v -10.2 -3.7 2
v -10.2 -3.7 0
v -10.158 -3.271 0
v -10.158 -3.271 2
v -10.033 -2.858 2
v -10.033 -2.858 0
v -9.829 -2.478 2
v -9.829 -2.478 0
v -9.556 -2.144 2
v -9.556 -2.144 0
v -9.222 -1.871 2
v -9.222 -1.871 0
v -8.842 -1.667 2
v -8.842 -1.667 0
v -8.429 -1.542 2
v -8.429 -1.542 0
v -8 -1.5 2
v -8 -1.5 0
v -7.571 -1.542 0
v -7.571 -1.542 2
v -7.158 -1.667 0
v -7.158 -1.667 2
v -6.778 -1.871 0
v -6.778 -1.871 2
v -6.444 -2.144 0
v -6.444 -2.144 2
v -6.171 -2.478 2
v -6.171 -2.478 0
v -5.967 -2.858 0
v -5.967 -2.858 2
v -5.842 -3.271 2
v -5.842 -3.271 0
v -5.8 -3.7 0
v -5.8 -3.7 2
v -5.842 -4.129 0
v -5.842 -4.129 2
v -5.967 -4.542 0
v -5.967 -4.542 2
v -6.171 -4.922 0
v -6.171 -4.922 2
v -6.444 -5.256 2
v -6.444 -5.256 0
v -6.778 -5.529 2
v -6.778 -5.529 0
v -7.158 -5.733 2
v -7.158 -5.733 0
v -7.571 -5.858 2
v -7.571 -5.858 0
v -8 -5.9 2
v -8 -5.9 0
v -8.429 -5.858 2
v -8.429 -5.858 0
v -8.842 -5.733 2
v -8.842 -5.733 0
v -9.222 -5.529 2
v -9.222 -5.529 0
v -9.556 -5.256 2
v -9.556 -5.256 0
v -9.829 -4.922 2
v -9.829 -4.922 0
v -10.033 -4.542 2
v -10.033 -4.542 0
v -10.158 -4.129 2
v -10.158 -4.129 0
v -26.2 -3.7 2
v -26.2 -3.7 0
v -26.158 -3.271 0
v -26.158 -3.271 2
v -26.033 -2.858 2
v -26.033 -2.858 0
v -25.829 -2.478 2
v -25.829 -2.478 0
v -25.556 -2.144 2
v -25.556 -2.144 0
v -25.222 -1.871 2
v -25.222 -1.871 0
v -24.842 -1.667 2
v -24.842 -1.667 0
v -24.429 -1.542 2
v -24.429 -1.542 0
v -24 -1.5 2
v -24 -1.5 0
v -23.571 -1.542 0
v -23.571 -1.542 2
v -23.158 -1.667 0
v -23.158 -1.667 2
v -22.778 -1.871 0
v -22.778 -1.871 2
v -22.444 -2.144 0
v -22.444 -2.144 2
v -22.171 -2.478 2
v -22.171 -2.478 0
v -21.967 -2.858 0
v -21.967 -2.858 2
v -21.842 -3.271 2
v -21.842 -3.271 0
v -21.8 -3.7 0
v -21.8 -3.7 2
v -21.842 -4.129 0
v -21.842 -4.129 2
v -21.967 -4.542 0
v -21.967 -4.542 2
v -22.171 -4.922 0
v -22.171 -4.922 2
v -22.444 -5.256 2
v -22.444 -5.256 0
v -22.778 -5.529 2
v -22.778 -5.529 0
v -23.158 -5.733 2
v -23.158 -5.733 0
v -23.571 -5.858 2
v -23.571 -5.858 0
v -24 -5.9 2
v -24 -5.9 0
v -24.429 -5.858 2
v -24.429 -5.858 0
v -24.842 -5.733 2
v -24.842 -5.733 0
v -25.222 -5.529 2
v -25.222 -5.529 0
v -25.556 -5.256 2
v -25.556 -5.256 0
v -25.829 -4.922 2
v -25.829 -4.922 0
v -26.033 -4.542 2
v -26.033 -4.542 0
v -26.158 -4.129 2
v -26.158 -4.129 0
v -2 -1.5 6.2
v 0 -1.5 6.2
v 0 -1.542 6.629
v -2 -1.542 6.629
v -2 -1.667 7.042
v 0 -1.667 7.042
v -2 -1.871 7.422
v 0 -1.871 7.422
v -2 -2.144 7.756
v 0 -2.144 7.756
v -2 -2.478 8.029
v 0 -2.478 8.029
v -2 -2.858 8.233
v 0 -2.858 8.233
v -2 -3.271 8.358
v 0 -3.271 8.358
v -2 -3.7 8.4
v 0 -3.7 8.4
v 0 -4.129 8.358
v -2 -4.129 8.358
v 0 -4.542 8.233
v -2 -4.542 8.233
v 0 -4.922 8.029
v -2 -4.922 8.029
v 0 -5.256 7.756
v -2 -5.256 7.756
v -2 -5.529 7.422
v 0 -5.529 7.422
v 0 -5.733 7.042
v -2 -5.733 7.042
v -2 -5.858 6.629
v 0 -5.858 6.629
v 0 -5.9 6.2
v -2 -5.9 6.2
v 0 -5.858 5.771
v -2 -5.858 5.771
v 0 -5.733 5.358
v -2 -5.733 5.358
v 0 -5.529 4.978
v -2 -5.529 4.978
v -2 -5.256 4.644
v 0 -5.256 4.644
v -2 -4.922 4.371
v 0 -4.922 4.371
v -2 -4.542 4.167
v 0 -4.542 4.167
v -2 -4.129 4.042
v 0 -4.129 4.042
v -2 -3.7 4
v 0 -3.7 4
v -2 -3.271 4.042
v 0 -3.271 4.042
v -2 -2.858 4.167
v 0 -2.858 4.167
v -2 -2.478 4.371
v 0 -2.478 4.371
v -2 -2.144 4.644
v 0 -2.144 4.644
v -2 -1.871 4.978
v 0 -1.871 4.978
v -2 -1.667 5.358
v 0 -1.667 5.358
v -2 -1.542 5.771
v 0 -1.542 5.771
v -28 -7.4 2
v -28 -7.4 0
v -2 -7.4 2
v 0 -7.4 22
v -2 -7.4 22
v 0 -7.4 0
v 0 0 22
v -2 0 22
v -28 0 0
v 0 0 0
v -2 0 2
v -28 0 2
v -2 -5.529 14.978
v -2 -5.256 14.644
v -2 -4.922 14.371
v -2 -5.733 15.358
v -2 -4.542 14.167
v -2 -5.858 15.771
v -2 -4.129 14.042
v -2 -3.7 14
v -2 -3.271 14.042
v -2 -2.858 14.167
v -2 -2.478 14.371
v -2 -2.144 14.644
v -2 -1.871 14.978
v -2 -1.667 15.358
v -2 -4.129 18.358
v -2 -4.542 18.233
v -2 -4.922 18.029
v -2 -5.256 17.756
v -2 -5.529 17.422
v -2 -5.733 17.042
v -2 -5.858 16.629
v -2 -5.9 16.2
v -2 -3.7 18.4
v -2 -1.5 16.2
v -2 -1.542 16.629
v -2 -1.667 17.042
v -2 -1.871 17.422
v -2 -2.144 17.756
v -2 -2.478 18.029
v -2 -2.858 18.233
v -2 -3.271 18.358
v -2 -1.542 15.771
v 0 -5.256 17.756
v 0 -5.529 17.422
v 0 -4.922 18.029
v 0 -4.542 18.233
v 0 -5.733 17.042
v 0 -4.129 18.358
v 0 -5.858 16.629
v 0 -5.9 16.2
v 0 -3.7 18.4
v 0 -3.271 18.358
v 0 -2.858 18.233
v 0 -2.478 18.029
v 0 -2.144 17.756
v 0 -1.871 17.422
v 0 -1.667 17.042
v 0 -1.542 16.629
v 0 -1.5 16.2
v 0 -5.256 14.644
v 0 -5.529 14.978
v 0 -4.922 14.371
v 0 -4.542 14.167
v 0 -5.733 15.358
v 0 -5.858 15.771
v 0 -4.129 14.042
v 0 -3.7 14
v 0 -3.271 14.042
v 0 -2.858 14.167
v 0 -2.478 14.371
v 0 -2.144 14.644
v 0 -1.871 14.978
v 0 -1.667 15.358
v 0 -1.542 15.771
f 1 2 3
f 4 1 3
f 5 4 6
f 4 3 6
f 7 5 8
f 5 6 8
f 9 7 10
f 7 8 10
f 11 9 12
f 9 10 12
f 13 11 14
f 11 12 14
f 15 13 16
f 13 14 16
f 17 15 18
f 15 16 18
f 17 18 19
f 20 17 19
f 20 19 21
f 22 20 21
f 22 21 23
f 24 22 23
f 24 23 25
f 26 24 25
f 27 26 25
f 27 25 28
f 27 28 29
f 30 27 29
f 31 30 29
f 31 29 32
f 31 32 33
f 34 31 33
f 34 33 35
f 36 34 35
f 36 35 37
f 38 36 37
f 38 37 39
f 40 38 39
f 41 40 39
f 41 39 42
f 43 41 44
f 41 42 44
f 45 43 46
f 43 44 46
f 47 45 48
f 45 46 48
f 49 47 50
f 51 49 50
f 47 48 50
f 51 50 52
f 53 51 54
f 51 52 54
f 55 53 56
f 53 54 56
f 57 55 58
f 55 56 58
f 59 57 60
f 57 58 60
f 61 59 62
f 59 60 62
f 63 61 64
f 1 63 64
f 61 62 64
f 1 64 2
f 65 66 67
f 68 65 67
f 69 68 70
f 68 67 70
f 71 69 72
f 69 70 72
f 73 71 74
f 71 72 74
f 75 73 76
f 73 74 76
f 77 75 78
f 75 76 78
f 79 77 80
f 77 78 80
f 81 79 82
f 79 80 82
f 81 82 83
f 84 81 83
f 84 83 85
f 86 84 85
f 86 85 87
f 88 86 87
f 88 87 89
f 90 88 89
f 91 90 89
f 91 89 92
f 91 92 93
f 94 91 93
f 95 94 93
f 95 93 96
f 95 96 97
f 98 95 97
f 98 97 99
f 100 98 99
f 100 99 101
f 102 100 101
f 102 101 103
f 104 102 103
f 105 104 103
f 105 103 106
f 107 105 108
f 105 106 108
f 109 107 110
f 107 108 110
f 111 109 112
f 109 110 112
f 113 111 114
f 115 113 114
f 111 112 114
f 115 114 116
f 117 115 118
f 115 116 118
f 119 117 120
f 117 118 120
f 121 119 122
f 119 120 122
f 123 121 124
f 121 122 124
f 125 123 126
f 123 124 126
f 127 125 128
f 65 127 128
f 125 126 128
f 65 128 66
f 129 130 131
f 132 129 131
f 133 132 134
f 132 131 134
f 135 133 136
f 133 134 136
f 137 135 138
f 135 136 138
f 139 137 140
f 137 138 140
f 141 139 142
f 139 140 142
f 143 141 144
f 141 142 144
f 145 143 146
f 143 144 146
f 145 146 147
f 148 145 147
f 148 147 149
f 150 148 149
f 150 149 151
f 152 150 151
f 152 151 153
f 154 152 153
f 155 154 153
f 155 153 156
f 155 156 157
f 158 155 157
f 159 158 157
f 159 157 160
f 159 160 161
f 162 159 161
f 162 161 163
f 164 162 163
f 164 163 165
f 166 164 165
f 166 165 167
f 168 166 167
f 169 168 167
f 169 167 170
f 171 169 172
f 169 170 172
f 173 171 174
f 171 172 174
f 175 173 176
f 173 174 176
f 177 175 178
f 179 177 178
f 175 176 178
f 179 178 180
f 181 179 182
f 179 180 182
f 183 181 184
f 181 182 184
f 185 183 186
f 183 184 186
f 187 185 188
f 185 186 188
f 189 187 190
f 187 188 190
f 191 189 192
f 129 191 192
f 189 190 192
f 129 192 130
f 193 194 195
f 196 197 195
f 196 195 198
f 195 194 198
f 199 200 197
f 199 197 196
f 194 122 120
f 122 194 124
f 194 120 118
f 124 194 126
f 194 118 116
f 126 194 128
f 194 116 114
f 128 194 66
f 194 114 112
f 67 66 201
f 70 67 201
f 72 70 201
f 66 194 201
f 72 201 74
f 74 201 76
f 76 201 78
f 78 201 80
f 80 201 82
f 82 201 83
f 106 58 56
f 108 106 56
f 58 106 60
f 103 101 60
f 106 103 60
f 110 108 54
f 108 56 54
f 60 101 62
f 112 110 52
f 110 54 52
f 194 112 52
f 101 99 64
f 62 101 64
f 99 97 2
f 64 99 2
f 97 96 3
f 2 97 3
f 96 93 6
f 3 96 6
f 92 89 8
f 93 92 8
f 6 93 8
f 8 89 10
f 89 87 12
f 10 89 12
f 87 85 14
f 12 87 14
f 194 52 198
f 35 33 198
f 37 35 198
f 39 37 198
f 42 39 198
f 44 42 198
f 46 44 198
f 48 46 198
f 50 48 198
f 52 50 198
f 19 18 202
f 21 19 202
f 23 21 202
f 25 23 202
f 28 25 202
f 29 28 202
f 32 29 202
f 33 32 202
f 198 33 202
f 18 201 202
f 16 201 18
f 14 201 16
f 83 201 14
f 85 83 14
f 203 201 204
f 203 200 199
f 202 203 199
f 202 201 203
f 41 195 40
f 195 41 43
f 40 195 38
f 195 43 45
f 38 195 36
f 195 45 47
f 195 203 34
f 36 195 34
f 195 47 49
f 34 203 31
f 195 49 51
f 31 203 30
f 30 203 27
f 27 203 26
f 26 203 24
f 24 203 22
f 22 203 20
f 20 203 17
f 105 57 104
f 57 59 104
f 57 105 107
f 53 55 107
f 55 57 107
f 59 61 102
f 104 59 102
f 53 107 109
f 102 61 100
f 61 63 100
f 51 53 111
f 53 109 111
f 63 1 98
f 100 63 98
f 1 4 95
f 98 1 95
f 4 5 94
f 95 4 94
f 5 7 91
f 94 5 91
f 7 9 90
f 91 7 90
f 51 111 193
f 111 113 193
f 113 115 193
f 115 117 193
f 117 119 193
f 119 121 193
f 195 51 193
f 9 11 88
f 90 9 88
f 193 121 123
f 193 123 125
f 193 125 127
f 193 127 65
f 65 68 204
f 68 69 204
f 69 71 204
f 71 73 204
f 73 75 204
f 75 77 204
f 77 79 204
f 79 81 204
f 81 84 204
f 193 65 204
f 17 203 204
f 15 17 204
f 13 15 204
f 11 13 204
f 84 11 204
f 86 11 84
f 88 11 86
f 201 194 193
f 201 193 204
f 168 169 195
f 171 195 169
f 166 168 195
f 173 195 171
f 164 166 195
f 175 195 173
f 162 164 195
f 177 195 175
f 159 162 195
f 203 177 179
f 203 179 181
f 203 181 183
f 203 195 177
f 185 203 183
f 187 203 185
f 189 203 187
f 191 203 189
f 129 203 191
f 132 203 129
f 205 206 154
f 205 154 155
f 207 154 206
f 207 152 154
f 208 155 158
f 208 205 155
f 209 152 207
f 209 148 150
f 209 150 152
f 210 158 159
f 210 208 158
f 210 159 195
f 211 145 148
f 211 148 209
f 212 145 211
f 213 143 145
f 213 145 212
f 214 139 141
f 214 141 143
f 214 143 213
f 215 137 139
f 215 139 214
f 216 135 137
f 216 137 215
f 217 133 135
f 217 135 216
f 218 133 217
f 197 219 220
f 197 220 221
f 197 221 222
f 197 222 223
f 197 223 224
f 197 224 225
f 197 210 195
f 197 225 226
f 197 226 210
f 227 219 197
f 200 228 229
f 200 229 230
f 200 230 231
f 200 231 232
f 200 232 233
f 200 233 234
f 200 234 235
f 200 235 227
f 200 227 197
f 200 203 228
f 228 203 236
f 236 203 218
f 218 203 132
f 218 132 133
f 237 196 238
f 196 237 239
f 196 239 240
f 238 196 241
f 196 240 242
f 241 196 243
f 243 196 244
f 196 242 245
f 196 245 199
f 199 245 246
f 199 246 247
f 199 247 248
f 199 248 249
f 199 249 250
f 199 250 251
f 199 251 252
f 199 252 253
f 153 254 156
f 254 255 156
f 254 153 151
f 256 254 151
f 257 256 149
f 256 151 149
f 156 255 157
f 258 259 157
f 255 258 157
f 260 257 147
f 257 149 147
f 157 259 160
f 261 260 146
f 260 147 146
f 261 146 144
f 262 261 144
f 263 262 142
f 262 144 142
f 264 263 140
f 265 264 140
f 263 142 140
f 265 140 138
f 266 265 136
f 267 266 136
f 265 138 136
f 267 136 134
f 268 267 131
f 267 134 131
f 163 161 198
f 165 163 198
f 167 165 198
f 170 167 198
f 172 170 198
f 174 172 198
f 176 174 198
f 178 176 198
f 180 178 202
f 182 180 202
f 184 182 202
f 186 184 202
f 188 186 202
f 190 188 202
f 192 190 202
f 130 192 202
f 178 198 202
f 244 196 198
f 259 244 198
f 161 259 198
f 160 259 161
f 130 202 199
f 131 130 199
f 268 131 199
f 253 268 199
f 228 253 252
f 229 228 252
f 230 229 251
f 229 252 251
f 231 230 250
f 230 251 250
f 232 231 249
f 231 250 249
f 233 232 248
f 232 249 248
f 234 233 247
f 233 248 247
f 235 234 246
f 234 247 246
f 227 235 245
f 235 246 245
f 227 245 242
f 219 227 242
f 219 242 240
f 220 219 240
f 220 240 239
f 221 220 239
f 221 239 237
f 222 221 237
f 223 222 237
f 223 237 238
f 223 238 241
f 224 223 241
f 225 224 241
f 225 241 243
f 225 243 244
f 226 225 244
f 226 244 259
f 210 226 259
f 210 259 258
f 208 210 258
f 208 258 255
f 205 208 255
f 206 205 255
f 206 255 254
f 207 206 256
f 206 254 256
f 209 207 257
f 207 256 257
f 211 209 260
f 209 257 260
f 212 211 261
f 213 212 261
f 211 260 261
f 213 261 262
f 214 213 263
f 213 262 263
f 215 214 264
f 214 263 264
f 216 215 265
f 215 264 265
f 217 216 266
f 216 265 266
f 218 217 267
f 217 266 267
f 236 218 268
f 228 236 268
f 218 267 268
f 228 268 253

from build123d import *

# Parameters (mm, degrees)
F0_W     = 28
F0_H     = 7.4
F1_DEPTH = 22
F3_D     = 4.4
F4_W     = 26
F4_H     = 20
F5_DEPTH = 25
F7_D     = 4.4


# Not quite as in the source:
# - a feature of the source that left no trace in its solid (it failed there, or was rolled back) is left out
# - a feature names something its author has since deleted; it is built from what else it names


with BuildPart() as f1:
    # F0 (on Top) → F1 (new body)
    with BuildSketch(Plane.XY):
        with Locations((-14, -3.7)):
            Rectangle(F0_W, F0_H)
    extrude(amount=F1_DEPTH)

    # F3 (through all)
    with Locations(Plane.XY.offset(22)):
        with Locations((-24, -3.7), (-8, -3.7)):
            Hole(F3_D / 2)

    # F4 (on face) → F5 (cut)
    with BuildSketch(Plane(origin=(0, 0, 0), x_dir=(-1, 0, 0), z_dir=(0, 1, 0))):
        with Locations((15, 12)):
            Rectangle(F4_W, F4_H)
    extrude(amount=-F5_DEPTH, mode=Mode.SUBTRACT)

    # F7 (through all)
    with Locations(Plane(origin=(-2, 0, 0), x_dir=(0, -1, 0), z_dir=(-1, 0, 0))):
        with Locations((3.7, 16.2), (3.7, 6.2)):
            Hole(F7_D / 2)


solid = f1.part
